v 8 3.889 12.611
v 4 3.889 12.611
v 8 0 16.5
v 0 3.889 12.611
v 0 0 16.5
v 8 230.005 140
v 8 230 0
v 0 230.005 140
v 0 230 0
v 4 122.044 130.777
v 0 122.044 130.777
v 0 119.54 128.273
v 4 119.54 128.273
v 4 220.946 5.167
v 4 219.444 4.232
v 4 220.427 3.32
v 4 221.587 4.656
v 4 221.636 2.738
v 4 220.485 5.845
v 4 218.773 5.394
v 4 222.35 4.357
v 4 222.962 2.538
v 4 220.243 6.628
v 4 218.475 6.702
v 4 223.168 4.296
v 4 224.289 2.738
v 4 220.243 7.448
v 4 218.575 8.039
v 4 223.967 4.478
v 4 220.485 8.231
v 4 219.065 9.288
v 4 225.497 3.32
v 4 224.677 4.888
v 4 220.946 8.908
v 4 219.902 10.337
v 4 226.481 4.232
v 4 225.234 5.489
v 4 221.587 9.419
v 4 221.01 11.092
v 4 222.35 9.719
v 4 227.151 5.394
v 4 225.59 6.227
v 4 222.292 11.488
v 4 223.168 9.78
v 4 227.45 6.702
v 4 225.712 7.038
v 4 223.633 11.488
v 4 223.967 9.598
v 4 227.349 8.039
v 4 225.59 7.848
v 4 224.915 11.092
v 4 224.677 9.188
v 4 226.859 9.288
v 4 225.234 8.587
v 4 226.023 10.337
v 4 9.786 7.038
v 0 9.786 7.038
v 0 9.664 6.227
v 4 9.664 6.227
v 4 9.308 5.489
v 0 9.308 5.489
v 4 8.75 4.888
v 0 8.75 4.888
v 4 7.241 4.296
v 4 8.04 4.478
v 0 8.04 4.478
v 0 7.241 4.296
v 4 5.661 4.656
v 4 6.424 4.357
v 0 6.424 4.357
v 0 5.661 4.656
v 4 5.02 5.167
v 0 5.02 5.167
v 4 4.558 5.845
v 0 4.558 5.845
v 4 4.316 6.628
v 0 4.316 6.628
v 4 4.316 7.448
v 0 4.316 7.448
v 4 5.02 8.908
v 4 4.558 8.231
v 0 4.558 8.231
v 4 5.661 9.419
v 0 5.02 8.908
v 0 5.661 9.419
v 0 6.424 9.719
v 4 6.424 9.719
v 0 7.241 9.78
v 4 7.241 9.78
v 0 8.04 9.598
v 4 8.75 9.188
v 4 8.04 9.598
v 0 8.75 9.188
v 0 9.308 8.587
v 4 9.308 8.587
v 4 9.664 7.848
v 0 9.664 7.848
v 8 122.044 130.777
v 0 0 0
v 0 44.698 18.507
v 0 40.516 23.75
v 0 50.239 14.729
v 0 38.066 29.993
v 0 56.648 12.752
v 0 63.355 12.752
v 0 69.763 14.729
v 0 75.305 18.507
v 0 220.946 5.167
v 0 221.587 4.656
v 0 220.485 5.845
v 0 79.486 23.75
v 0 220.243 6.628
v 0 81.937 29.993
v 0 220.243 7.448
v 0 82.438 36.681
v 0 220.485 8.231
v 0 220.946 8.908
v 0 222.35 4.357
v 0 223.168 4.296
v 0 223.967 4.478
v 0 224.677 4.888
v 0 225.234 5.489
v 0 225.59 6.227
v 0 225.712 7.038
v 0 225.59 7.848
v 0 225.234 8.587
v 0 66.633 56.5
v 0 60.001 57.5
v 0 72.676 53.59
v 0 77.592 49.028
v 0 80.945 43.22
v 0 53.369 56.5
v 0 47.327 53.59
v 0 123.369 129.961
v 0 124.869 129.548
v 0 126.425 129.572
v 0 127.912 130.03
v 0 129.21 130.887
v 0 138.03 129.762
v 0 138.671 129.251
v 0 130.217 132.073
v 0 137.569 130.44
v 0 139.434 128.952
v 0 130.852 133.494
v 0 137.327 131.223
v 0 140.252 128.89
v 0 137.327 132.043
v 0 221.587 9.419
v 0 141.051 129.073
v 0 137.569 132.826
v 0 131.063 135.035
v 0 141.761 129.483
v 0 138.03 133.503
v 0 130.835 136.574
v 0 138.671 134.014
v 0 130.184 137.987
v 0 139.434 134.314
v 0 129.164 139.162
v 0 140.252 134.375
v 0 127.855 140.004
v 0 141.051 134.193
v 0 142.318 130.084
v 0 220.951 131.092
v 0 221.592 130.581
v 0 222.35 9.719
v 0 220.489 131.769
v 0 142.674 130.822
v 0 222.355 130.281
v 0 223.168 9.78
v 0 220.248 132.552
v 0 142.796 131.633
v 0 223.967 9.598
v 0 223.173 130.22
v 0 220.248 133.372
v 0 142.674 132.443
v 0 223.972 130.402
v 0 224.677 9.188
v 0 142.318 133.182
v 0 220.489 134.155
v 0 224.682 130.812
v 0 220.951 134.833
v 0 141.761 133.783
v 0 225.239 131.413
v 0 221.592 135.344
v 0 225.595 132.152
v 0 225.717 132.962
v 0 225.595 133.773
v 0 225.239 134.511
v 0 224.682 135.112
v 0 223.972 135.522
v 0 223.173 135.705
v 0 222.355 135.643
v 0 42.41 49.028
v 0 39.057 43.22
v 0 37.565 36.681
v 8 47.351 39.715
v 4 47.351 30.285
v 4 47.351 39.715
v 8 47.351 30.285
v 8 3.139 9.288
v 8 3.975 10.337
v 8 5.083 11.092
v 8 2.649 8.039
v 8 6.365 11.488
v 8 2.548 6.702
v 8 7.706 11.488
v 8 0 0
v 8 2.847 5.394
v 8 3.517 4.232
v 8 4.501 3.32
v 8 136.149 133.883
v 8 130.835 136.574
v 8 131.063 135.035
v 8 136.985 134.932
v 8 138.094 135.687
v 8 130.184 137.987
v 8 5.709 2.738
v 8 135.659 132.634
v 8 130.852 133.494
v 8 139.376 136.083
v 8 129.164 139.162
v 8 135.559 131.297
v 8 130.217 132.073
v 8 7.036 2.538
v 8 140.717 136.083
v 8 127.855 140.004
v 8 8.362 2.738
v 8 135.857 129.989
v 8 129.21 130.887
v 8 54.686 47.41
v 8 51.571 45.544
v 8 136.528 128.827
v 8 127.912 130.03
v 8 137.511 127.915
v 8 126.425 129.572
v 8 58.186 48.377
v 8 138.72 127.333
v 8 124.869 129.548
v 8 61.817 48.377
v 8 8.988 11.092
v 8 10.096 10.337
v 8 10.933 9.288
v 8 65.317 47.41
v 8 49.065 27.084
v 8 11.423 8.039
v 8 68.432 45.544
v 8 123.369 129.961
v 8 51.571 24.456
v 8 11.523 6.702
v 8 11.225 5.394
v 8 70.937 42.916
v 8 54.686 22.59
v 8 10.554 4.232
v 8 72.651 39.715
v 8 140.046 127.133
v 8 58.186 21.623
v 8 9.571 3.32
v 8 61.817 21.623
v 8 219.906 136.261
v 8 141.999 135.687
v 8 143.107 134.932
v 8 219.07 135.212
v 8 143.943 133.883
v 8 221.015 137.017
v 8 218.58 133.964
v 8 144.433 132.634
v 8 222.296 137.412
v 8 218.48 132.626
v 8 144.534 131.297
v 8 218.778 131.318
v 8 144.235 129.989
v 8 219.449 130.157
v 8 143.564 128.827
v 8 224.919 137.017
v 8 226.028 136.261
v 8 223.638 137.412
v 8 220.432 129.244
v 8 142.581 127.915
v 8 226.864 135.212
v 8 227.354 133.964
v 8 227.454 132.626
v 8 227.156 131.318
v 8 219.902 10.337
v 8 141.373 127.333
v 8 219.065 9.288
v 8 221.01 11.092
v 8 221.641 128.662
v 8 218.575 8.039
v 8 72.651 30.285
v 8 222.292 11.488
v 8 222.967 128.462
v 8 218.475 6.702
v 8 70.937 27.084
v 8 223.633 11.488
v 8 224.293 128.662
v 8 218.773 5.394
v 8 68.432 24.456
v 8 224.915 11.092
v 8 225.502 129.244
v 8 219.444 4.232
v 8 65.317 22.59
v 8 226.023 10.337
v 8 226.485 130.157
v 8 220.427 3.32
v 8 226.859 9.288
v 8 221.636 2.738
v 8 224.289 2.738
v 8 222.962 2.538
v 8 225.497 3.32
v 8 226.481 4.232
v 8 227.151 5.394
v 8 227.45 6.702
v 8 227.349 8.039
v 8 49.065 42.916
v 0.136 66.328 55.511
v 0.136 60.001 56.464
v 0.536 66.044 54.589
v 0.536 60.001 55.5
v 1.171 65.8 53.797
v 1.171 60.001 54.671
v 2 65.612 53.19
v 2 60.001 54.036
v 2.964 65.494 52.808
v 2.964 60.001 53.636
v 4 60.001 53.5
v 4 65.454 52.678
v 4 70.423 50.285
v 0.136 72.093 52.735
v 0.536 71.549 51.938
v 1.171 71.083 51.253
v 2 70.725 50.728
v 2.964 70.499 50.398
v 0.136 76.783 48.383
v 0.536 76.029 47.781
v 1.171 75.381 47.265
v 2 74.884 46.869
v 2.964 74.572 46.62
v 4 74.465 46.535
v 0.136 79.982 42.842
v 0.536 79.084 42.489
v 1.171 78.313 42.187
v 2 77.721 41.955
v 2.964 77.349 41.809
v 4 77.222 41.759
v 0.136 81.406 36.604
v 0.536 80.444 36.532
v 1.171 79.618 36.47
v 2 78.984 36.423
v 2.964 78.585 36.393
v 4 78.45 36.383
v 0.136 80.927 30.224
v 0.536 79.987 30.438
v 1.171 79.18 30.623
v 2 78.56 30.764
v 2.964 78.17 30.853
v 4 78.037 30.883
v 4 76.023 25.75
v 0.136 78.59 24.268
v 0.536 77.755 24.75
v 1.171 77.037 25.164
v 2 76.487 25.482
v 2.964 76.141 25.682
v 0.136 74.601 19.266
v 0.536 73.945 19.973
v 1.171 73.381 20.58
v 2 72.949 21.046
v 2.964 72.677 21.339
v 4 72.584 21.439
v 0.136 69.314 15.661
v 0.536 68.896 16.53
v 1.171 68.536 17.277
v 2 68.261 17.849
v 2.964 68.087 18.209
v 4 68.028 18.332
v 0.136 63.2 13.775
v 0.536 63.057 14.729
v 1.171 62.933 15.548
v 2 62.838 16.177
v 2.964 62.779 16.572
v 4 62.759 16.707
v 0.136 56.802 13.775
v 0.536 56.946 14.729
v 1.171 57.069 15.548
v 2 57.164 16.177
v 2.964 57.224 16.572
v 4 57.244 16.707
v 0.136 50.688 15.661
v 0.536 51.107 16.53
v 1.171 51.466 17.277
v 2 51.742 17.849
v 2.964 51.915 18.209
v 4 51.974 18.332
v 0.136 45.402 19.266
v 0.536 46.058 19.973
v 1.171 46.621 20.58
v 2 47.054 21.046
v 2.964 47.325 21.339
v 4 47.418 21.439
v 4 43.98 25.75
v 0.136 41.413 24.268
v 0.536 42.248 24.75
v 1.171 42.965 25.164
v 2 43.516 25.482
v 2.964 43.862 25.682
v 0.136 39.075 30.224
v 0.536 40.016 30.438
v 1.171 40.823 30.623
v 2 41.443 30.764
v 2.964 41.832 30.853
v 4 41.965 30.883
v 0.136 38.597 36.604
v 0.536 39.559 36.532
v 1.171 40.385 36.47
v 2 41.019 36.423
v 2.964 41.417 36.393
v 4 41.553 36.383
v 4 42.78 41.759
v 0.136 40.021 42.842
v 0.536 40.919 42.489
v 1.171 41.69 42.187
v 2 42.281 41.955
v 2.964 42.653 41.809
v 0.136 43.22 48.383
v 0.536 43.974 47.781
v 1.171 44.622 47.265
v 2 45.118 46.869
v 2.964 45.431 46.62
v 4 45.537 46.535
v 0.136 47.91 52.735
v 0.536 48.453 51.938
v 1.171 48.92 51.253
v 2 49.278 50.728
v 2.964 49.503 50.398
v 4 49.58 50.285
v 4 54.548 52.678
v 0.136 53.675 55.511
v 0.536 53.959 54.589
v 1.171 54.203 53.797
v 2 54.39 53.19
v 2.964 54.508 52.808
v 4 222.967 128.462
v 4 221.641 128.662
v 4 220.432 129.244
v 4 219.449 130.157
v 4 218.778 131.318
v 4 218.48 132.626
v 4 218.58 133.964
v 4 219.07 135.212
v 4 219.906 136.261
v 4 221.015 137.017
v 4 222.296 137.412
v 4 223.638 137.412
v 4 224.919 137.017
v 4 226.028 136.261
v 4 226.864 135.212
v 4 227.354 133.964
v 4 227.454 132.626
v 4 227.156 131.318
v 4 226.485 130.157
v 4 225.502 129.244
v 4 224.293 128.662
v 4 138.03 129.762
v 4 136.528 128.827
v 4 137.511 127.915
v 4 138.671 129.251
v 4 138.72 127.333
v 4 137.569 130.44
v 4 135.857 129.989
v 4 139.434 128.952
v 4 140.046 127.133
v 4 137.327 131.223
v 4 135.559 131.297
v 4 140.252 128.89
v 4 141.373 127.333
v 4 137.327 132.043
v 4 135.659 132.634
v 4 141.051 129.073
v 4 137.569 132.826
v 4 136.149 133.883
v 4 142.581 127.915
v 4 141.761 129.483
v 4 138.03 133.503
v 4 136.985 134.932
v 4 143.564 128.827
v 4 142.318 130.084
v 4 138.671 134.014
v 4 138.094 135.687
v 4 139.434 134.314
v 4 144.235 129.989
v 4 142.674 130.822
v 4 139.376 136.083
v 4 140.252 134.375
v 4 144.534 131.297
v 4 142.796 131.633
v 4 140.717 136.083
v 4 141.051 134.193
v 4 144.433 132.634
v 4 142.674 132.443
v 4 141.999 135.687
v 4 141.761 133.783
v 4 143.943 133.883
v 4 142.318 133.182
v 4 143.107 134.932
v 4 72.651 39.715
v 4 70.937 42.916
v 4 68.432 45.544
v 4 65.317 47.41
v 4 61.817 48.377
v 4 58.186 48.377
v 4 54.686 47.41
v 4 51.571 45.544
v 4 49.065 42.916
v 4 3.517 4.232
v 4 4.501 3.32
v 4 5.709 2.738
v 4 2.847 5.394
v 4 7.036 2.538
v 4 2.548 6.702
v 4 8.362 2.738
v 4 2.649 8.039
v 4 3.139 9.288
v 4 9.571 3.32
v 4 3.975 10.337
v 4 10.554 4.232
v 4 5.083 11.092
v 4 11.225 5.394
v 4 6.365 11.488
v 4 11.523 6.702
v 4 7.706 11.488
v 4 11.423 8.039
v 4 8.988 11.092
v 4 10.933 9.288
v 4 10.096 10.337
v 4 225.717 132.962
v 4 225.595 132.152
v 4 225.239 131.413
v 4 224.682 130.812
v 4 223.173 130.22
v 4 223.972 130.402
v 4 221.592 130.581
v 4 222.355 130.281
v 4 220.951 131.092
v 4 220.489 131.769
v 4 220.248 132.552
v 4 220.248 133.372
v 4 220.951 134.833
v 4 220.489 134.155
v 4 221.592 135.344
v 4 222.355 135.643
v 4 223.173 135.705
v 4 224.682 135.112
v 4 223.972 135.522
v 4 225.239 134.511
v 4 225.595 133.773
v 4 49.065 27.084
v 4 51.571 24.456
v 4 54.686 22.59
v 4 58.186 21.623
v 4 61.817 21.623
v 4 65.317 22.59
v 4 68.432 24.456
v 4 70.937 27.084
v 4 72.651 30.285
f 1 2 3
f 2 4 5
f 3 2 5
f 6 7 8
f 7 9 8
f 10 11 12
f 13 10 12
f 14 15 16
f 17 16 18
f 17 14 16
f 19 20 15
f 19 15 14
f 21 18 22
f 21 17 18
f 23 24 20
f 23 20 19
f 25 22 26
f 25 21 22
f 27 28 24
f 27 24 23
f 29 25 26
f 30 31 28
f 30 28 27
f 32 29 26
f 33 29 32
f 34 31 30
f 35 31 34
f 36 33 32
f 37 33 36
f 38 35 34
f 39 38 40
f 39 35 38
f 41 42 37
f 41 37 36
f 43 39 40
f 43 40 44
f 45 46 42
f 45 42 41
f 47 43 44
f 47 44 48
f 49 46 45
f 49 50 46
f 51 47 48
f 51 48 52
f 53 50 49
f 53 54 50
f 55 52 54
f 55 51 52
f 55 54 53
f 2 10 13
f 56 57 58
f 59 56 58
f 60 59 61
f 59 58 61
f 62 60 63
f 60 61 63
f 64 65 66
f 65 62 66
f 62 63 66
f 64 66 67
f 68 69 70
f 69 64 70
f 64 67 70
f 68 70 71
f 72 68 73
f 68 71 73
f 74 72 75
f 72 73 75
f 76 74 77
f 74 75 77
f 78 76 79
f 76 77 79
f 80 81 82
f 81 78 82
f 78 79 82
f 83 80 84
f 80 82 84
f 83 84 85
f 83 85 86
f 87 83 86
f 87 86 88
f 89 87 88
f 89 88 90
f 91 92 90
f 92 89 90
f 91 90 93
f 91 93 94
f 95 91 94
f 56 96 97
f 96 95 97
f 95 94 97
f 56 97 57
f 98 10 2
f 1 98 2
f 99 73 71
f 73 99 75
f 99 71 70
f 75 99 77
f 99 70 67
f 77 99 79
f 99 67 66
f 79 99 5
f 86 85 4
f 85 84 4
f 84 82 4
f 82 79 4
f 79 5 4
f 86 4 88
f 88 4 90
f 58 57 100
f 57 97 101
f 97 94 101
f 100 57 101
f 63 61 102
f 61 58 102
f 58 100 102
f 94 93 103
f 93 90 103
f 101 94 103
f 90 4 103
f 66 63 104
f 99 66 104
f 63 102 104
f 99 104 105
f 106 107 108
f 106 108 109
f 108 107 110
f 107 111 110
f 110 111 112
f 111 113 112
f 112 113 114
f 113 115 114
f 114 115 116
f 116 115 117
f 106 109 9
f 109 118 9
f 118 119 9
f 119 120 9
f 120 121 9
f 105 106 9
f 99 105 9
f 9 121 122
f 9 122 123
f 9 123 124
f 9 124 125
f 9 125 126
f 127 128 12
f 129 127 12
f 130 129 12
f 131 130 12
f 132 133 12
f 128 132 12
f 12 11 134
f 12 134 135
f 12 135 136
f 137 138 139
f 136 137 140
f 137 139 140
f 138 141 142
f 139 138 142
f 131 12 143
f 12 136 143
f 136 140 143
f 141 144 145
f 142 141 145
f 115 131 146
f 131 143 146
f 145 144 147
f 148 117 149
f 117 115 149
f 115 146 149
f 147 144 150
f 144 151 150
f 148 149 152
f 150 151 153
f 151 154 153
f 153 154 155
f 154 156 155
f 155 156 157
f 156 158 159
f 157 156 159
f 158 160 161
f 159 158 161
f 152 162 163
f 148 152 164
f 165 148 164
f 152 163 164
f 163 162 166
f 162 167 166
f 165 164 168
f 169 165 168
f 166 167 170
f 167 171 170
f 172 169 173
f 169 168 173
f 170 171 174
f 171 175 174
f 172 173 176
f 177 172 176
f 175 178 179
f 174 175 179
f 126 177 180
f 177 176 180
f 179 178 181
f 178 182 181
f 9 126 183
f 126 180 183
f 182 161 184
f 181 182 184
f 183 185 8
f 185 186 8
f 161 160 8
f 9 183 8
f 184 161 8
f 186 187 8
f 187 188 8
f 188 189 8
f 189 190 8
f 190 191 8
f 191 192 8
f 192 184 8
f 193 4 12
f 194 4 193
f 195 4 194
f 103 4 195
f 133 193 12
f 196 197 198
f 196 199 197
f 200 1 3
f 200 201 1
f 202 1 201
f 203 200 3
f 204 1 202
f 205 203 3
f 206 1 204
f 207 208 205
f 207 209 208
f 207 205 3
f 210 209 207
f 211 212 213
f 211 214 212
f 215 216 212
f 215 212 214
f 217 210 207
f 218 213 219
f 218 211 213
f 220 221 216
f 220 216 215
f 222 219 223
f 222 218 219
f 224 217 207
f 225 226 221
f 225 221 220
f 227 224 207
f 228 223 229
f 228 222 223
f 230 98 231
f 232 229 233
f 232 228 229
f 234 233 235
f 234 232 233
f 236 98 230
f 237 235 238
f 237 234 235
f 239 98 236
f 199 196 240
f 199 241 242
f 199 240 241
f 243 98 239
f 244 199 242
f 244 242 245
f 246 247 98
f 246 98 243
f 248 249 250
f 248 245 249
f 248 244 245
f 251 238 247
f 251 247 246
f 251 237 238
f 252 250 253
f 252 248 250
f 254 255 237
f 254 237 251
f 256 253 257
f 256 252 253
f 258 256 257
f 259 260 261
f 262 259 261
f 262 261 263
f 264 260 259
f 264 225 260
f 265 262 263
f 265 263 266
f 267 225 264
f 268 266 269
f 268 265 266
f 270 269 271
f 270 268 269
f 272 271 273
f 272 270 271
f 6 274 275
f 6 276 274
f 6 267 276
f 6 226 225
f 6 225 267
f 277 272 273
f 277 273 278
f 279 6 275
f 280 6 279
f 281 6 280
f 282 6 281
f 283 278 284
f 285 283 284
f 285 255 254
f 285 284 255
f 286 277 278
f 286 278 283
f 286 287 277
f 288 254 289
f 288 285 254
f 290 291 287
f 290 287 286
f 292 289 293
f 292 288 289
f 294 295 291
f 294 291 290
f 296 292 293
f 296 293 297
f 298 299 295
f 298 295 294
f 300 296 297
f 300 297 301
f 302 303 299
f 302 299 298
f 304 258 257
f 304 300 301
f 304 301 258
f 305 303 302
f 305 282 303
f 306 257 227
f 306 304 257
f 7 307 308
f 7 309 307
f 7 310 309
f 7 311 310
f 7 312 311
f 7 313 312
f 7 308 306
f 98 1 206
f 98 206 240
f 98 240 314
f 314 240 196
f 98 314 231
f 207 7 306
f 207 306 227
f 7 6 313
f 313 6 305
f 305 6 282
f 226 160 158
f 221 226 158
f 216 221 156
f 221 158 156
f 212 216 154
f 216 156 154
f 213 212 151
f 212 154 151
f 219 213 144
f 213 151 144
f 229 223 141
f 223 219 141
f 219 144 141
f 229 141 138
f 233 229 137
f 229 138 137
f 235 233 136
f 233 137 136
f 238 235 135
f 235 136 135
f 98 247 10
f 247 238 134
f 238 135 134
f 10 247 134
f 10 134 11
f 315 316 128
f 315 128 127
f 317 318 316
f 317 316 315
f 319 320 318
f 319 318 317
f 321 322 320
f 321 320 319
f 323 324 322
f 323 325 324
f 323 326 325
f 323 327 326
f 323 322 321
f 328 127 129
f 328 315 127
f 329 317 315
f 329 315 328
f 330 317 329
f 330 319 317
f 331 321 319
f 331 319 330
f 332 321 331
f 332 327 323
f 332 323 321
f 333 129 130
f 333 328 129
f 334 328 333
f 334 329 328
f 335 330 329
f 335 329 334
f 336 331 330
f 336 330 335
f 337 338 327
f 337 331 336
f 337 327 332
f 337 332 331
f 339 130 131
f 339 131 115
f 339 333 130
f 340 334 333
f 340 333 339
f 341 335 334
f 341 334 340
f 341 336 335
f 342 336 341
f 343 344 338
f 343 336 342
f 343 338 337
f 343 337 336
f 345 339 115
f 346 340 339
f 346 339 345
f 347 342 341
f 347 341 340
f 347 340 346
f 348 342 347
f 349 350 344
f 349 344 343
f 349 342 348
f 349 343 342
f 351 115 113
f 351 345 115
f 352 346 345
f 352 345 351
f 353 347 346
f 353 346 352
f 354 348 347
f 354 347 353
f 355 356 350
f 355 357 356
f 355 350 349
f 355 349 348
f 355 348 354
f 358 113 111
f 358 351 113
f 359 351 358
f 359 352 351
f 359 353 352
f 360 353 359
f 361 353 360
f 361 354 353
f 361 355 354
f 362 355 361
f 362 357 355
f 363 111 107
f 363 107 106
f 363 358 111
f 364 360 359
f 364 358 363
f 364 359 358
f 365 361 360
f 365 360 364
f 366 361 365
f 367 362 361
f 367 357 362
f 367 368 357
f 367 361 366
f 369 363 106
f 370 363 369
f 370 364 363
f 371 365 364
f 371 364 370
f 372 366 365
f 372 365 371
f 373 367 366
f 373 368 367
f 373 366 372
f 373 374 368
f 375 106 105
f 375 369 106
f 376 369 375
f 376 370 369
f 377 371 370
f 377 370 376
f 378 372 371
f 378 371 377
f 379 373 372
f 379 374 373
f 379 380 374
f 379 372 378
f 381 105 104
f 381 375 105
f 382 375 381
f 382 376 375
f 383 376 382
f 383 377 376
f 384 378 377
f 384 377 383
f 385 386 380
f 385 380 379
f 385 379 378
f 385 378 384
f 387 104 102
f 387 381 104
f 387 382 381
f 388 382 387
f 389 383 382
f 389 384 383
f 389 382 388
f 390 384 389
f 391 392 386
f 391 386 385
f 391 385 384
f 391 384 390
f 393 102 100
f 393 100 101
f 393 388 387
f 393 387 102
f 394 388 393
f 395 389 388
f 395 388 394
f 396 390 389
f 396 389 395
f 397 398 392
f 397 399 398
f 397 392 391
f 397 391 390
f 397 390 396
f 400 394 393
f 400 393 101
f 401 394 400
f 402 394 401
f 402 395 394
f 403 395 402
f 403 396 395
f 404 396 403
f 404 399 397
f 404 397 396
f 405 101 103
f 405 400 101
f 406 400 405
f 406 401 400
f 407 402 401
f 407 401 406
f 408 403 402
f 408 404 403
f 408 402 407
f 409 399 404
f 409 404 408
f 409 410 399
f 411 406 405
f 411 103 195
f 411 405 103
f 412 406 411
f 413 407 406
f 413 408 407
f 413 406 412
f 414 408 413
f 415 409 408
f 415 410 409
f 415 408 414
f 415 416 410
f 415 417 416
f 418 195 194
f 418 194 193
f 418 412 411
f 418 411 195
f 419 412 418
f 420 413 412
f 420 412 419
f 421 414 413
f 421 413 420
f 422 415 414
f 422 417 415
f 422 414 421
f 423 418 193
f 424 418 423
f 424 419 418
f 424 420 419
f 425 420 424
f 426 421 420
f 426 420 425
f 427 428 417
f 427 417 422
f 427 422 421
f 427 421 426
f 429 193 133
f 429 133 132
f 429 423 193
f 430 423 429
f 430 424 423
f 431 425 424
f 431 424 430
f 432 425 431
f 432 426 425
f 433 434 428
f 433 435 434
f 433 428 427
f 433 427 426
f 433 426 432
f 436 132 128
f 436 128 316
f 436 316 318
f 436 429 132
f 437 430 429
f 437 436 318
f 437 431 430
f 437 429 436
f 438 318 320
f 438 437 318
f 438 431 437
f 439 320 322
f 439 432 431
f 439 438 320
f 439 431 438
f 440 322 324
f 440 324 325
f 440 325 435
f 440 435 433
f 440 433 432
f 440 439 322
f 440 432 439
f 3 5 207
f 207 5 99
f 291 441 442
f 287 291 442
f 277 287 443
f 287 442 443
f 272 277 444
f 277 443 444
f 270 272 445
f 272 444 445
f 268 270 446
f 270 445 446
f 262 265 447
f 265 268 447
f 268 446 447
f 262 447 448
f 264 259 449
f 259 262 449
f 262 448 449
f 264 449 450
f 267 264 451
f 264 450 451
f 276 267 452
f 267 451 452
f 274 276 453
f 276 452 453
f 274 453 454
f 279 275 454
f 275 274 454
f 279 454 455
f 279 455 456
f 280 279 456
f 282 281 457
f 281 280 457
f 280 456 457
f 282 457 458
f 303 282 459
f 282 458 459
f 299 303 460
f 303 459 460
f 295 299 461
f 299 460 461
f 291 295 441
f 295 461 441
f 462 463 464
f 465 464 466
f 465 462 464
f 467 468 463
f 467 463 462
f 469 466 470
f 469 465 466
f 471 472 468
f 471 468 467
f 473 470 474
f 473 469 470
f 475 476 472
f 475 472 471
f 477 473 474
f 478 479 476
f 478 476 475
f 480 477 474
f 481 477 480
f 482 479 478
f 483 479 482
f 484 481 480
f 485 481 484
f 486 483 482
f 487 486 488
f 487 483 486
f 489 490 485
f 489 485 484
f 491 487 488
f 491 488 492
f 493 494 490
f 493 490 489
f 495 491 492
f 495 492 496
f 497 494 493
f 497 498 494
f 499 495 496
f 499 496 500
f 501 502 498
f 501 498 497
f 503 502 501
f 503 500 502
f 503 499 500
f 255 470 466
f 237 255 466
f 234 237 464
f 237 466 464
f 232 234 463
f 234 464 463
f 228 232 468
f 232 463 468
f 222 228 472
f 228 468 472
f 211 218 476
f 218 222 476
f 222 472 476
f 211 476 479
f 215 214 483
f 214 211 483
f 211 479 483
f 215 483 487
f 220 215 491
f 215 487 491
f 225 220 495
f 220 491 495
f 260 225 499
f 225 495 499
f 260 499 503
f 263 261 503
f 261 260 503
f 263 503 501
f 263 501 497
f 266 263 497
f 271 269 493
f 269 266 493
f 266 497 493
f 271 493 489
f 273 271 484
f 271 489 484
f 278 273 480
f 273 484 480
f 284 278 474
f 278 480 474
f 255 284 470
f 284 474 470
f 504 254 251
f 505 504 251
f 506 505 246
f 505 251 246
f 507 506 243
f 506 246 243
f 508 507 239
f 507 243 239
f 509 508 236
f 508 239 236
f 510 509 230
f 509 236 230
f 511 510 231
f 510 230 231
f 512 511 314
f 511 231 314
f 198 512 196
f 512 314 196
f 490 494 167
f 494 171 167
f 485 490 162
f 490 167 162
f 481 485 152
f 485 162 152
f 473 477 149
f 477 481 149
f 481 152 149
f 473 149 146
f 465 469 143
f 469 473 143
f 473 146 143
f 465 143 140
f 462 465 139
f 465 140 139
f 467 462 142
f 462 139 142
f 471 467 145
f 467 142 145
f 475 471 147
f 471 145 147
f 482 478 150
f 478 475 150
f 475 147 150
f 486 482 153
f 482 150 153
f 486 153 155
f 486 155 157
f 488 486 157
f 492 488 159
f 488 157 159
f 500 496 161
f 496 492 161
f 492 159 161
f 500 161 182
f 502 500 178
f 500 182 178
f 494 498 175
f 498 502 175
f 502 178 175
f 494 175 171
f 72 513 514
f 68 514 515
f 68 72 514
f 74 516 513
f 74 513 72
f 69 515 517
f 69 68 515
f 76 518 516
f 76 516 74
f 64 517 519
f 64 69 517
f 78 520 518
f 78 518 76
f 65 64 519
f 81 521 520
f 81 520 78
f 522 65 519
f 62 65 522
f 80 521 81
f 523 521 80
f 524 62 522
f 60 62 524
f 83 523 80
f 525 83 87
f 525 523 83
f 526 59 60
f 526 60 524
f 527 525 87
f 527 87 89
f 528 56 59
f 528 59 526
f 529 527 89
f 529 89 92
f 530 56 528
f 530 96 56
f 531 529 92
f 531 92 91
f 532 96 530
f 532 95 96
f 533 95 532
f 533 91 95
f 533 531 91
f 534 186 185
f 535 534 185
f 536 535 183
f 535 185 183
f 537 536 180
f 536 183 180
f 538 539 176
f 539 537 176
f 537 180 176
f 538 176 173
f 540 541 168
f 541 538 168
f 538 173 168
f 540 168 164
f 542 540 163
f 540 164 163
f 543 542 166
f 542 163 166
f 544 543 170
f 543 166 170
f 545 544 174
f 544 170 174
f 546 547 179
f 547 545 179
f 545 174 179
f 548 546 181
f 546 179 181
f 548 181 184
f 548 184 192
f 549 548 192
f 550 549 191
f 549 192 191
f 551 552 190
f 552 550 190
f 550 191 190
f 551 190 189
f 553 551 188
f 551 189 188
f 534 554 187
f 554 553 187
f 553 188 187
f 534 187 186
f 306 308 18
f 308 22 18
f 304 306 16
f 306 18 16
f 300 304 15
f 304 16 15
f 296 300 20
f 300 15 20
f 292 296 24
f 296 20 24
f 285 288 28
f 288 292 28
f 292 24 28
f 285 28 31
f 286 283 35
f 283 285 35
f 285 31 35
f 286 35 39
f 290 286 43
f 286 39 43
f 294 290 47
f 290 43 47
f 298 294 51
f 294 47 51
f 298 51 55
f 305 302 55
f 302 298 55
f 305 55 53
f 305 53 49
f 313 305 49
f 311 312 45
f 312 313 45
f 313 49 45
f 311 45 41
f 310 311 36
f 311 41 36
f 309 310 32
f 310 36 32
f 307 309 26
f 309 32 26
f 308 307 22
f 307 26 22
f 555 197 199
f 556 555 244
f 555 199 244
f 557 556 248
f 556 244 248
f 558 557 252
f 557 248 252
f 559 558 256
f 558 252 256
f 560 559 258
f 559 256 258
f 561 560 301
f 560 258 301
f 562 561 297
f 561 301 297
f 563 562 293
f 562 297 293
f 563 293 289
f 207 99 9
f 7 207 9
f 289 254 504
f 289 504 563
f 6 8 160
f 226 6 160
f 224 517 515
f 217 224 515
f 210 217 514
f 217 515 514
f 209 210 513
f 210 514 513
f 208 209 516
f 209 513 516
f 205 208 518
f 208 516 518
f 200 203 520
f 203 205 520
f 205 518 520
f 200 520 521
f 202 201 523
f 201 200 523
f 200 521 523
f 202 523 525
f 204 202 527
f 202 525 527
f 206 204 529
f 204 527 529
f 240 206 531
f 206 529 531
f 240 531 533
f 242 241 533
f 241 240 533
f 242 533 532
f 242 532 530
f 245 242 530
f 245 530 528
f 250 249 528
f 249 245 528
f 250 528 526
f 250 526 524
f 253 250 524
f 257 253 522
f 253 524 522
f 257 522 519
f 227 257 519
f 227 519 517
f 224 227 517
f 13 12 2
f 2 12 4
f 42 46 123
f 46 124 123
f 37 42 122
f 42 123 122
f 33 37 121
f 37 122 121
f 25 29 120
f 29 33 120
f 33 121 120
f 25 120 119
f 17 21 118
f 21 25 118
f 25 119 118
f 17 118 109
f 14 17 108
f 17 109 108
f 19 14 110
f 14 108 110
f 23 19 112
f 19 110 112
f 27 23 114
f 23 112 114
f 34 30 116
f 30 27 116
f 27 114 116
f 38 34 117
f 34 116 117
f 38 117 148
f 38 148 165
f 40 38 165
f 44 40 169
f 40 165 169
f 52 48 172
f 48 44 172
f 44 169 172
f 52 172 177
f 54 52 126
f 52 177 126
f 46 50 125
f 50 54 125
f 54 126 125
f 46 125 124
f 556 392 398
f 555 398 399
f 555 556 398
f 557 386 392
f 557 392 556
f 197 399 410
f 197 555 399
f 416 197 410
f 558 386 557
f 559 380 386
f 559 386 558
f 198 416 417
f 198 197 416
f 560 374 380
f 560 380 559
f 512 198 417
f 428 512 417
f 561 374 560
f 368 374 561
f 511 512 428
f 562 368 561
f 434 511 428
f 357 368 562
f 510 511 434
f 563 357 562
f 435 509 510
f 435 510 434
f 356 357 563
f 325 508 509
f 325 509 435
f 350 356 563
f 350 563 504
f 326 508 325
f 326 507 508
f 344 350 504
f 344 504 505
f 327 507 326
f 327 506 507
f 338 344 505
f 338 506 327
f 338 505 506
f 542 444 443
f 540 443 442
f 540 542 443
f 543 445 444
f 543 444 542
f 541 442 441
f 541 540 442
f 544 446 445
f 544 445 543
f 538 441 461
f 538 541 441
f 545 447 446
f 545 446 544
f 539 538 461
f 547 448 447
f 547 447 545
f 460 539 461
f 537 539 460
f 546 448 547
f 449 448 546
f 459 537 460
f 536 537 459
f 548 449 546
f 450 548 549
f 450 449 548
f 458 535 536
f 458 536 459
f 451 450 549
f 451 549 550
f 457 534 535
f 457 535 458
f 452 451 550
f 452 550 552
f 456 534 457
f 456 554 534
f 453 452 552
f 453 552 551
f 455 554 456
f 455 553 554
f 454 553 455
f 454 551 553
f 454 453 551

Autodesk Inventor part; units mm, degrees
ref_plane "YZ Plane" through (0, 0, 0) normal (1, 0, 0) x (0, 1, 0)
ref_plane "XZ Plane" through (0, 0, 0) normal (0, 1, 0) x (-1, 0, 0)
ref_plane "XY Plane" through (0, 0, 0) normal (0, 0, 1) x (1, 0, 0)
sketch "Sketch1" plane through (0, 0, 0) normal (1, 0, 0) x (0, 1, 0)
  circle A0 centre (7.0357, 7.0379) radius 4.5 construction
  circle A1 centre (222.967, 132.9623) radius 4.5 construction
  arc A2 (216.9926, 130.402) -> (220.4062, 126.988) centre (222.967, 132.9623) ccw construction
  arc A3 (226.4665, 117.7965) -> (220.4062, 126.988) centre (216.4665, 117.7968) ccw construction
  line L0 (226.4665, 117.7965) -> (226.4629, 22.2035) construction
  arc A4 (220.402, 13.0124) -> (226.4629, 22.2035) centre (216.4629, 22.2039) ccw construction
  arc A5 (220.402, 13.0124) -> (216.9879, 9.5985) centre (222.9623, 7.0379) ccw construction
  arc A6 (207.7966, 3.5379) -> (216.9879, 9.5985) centre (207.7966, 13.5379) ccw construction
  line L1 (207.7966, 3.5379) -> (22.2015, 3.5379) construction
  arc A7 (13.0101, 9.5985) -> (22.2015, 3.5379) centre (22.2015, 13.5379) ccw construction
  arc A8 (13.0101, 9.5985) -> (10.3808, 12.6111) centre (7.0357, 7.0379) ccw construction
  line L2 (10.3808, 12.6111) -> (3.8893, 12.6111) construction
  line L3 (3.8893, 12.6111) -> (0, 16.5)
  line L4 (0, 16.5) -> (0, 0)
  line L5 (0, 0) -> (230, 0)
  line L6 (230, 0) -> (230.0052, 140)
  line L7 (230.0052, 140) -> (127.855, 140.0038)
  arc A9 (122.0443, 130.7772) -> (127.855, 140.0038) centre (125.5635, 135.0039) ccw
  line L8 (122.0443, 130.7772) -> (119.5403, 128.2731)
  arc A10 (119.5403, 128.2731) -> (128.6878, 126.5292) centre (125.5635, 135.0039) ccw
  arc A11 (136.9343, 125.9261) -> (128.6878, 126.5292) centre (132.1469, 117.1465) ccw construction
  arc A12 (136.9343, 125.9261) -> (146.2191, 129.5969) centre (140.0462, 131.6328) ccw construction
  arc A13 (155.7163, 136.4648) -> (146.2191, 129.5969) centre (155.716, 126.4648) ccw construction
  line L9 (155.7163, 136.4648) -> (207.8014, 136.4629) construction
  arc A14 (216.9926, 130.402) -> (207.8014, 136.4629) centre (207.801, 126.4629) ccw construction
  circle A15 centre (222.9623, 7.0379) radius 4.5 construction
  circle A16 centre (140.0462, 131.6328) radius 4.5 construction
  arc A17 (184.962, 3.5379) -> (165.0484, 3.5379) centre (175.0052, 35) ccw construction
  line L10 (184.962, 3.5379) -> (226.4622, 3.5379) construction
  line L11 (226.4622, 3.5379) -> (226.4634, 35.0003) construction
  arc A18 (223.4634, 32.0004) -> (226.4634, 35.0003) centre (223.4634, 35.0004) ccw construction
  line L12 (223.4634, 32.0004) -> (213.4634, 32.0004) construction
  arc A19 (213.4634, 38.0004) -> (213.4634, 32.0004) centre (213.4634, 35.0004) ccw construction
  line L13 (213.4634, 38.0004) -> (223.4634, 38.0004) construction
  arc A20 (226.4634, 35.0003) -> (223.4634, 38.0004) centre (223.4634, 35.0004) ccw construction
  line L14 (226.4634, 35.0003) -> (226.4647, 70.0003) construction
  arc A21 (223.4647, 67.0004) -> (226.4647, 70.0003) centre (223.4647, 70.0004) ccw construction
  line L15 (223.4647, 67.0004) -> (213.4647, 67.0004) construction
  arc A22 (213.4647, 73.0004) -> (213.4647, 67.0004) centre (213.4647, 70.0004) ccw construction
  line L16 (213.4647, 73.0004) -> (223.4647, 73.0004) construction
  arc A23 (226.4647, 70.0003) -> (223.4647, 73.0004) centre (223.4647, 70.0004) ccw construction
  line L17 (226.4647, 70.0003) -> (226.466, 105.0003) construction
  arc A24 (223.466, 102.0004) -> (226.466, 105.0003) centre (223.466, 105.0004) ccw construction
  line L18 (223.466, 102.0004) -> (213.466, 102.0004) construction
  arc A25 (213.466, 108.0004) -> (213.466, 102.0004) centre (213.466, 105.0004) ccw construction
  line L19 (213.466, 108.0004) -> (223.466, 108.0004) construction
  arc A26 (226.466, 105.0003) -> (223.466, 108.0004) centre (223.466, 105.0004) ccw construction
  line L20 (226.466, 105.0003) -> (226.4672, 136.4622) construction
  line L21 (226.4672, 136.4622) -> (145.4199, 136.4652) construction
  arc A27 (145.4199, 136.4652) -> (133.0261, 129.9155) centre (145.4194, 121.4652) ccw construction
  arc A28 (119.5403, 128.2731) -> (133.0261, 129.9155) centre (125.5635, 135.0039) ccw construction
  line L22 (119.5403, 128.2731) -> (3.8893, 12.6111)
  line L23 (3.8893, 12.6111) -> (3.5357, 12.9646)
  line L24 (3.5357, 12.9646) -> (3.5357, 3.5379) construction
  line L25 (3.5357, 3.5379) -> (165.0484, 3.5379) construction
  circle A29 centre (7.0357, 7.0379) radius 2.75
  circle A30 centre (222.9623, 7.0379) radius 2.75
  circle A31 centre (222.967, 132.9623) radius 2.75
  circle A32 centre (140.0462, 131.6328) radius 2.75
  dimension "d0" = 5.5
  dimension "d1" = 5.5
  dimension "d2" = 5.5
  dimension "d3" = 5.5
extrude "Extrusion1" add sketch "Sketch1" along normal blind 4
sketch "Sketch2" plane through (4, 0, 0) normal (1, 0, 0) x (0, 0, -1)
  line L0 (0, 0) -> (0, 230) projected
  line L1 (0, 230) -> (-140, 230.0052) projected
  line L2 (-140, 230.0052) -> (-140.0038, 127.855) projected
  arc A0 (-130.7772, 122.0443) -> (-140.0038, 127.855) centre (-135.0039, 125.5635) ccw projected
  line L3 (-130.7772, 122.0443) -> (-12.6111, 3.8893) projected
  line L4 (-12.6111, 3.8893) -> (-16.5, 0) projected
  line L5 (-16.5, 0) -> (0, 0) projected
  circle A1 centre (-7.0379, 7.0357) radius 2.75 projected
  circle A2 centre (-7.0379, 222.9623) radius 2.75 projected
  circle A3 centre (-132.9623, 222.967) radius 2.75 projected
  circle A4 centre (-131.6328, 140.0462) radius 2.75 projected
  circle A5 centre (-131.6328, 140.0462) radius 2.75 projected
  circle A6 centre (-131.6328, 140.0462) radius 4.5
  circle A7 centre (-132.9623, 222.967) radius 2.75 projected
  circle A8 centre (-132.9623, 222.967) radius 4.5
  circle A9 centre (-7.0379, 222.9623) radius 4.5
  circle A10 centre (-7.0379, 7.0357) radius 2.75 projected
  circle A11 centre (-7.0379, 7.0357) radius 4.5
  dimension "d6" = 9
  dimension "d7" = 9
  dimension "d8" = 9
  dimension "d9" = 9
extrude "Extrusion2" add sketch "Sketch2" along normal blind 4 contours L5 L4 L3 A0 L2 L1 L0
sketch "Sketch3" plane through (8, 0, 0) normal (1, 0, 0) x (0, 0, -1)
  line L0 (0, 0) -> (0, 230) construction
  line L1 (0, 60) -> (-140.0064, 60.0052) construction
  line L2 (-140, 230.0052) -> (-140.0038, 127.855) construction
  line L3 (-127.855, 140.0038) -> (-230.0052, 140) construction
  line L4 (-210.0052, 140.0007) -> (-210.0052, 0) construction
  line L5 (-230, 0) -> (0, 0) construction
  circle A0 centre (-35, 60.0013) radius 13.5
  line L6 (-57.0351, 47.3513) -> (-57.0351, 72.6513)
  line L7 (-57.0351, 72.6513) -> (-14.4833, 72.6513)
  line L8 (-14.4833, 72.6513) -> (-14.4833, 47.3513)
  line L9 (-14.4833, 47.3513) -> (-57.0351, 47.3513)
  line L10 (-3.55, 0) -> (-3.55, 230) construction
  point P0 (-187.6552, 39.7146)
  point P1 (-187.6552, 30.2854)
  point P2 (-162.3552, 30.2854)
  point P3 (-162.3552, 39.7146)
  point P4 (-39.7146, 47.3513)
  point P5 (-30.2854, 47.3513)
  point P6 (-30.2854, 72.6513)
  point P7 (-39.7146, 72.6513)
  dimension "d12" = 60
  dimension "d13" = 20
  dimension "d14" = 27
  dimension "d17" = 25.3
  dimension "d18" = 0.85
  dimension "d19" = 3.55
  dimension "d20" = 22.0352
  dimension "d21" = 42.5518
  dimension "d22" = 21.5
extrude "Extrusion3" cut sketch "Sketch3" against normal up to next contours A0 L9 L7
sketch "Sketch4" plane through (0, 0, 0) normal (-1, 0, 0) x (0, 0, 1)
  line L0 (30.2854, 72.6513) -> (39.7146, 72.6513) construction
  line L1 (35, 72.6513) -> (35, 47.3513) construction
  line L2 (30.2854, 47.3513) -> (39.7146, 47.3513) construction
  circle A0 centre (35, 60.0013) radius 18.5
  point P0 (0, 0)
  dimension "d25" = 37
extrude "Extrusion4" cut sketch "Sketch4" against normal blind 4
fillet "Fillet1" radius 4 1 edges at (0, 60.0013, 16.5)
equation "\"d1\" = d0"
equation "\"d2\" = d0"
equation "\"d3\" = d0"
equation "\"d7\" = d6"
equation "\"d8\" = d6"
equation "\"d9\" = d6"
equation "\"d18\" = -0.5 * d17 + 0.5 * d14"
properties part number "Operator Junction Box Side Panel"
